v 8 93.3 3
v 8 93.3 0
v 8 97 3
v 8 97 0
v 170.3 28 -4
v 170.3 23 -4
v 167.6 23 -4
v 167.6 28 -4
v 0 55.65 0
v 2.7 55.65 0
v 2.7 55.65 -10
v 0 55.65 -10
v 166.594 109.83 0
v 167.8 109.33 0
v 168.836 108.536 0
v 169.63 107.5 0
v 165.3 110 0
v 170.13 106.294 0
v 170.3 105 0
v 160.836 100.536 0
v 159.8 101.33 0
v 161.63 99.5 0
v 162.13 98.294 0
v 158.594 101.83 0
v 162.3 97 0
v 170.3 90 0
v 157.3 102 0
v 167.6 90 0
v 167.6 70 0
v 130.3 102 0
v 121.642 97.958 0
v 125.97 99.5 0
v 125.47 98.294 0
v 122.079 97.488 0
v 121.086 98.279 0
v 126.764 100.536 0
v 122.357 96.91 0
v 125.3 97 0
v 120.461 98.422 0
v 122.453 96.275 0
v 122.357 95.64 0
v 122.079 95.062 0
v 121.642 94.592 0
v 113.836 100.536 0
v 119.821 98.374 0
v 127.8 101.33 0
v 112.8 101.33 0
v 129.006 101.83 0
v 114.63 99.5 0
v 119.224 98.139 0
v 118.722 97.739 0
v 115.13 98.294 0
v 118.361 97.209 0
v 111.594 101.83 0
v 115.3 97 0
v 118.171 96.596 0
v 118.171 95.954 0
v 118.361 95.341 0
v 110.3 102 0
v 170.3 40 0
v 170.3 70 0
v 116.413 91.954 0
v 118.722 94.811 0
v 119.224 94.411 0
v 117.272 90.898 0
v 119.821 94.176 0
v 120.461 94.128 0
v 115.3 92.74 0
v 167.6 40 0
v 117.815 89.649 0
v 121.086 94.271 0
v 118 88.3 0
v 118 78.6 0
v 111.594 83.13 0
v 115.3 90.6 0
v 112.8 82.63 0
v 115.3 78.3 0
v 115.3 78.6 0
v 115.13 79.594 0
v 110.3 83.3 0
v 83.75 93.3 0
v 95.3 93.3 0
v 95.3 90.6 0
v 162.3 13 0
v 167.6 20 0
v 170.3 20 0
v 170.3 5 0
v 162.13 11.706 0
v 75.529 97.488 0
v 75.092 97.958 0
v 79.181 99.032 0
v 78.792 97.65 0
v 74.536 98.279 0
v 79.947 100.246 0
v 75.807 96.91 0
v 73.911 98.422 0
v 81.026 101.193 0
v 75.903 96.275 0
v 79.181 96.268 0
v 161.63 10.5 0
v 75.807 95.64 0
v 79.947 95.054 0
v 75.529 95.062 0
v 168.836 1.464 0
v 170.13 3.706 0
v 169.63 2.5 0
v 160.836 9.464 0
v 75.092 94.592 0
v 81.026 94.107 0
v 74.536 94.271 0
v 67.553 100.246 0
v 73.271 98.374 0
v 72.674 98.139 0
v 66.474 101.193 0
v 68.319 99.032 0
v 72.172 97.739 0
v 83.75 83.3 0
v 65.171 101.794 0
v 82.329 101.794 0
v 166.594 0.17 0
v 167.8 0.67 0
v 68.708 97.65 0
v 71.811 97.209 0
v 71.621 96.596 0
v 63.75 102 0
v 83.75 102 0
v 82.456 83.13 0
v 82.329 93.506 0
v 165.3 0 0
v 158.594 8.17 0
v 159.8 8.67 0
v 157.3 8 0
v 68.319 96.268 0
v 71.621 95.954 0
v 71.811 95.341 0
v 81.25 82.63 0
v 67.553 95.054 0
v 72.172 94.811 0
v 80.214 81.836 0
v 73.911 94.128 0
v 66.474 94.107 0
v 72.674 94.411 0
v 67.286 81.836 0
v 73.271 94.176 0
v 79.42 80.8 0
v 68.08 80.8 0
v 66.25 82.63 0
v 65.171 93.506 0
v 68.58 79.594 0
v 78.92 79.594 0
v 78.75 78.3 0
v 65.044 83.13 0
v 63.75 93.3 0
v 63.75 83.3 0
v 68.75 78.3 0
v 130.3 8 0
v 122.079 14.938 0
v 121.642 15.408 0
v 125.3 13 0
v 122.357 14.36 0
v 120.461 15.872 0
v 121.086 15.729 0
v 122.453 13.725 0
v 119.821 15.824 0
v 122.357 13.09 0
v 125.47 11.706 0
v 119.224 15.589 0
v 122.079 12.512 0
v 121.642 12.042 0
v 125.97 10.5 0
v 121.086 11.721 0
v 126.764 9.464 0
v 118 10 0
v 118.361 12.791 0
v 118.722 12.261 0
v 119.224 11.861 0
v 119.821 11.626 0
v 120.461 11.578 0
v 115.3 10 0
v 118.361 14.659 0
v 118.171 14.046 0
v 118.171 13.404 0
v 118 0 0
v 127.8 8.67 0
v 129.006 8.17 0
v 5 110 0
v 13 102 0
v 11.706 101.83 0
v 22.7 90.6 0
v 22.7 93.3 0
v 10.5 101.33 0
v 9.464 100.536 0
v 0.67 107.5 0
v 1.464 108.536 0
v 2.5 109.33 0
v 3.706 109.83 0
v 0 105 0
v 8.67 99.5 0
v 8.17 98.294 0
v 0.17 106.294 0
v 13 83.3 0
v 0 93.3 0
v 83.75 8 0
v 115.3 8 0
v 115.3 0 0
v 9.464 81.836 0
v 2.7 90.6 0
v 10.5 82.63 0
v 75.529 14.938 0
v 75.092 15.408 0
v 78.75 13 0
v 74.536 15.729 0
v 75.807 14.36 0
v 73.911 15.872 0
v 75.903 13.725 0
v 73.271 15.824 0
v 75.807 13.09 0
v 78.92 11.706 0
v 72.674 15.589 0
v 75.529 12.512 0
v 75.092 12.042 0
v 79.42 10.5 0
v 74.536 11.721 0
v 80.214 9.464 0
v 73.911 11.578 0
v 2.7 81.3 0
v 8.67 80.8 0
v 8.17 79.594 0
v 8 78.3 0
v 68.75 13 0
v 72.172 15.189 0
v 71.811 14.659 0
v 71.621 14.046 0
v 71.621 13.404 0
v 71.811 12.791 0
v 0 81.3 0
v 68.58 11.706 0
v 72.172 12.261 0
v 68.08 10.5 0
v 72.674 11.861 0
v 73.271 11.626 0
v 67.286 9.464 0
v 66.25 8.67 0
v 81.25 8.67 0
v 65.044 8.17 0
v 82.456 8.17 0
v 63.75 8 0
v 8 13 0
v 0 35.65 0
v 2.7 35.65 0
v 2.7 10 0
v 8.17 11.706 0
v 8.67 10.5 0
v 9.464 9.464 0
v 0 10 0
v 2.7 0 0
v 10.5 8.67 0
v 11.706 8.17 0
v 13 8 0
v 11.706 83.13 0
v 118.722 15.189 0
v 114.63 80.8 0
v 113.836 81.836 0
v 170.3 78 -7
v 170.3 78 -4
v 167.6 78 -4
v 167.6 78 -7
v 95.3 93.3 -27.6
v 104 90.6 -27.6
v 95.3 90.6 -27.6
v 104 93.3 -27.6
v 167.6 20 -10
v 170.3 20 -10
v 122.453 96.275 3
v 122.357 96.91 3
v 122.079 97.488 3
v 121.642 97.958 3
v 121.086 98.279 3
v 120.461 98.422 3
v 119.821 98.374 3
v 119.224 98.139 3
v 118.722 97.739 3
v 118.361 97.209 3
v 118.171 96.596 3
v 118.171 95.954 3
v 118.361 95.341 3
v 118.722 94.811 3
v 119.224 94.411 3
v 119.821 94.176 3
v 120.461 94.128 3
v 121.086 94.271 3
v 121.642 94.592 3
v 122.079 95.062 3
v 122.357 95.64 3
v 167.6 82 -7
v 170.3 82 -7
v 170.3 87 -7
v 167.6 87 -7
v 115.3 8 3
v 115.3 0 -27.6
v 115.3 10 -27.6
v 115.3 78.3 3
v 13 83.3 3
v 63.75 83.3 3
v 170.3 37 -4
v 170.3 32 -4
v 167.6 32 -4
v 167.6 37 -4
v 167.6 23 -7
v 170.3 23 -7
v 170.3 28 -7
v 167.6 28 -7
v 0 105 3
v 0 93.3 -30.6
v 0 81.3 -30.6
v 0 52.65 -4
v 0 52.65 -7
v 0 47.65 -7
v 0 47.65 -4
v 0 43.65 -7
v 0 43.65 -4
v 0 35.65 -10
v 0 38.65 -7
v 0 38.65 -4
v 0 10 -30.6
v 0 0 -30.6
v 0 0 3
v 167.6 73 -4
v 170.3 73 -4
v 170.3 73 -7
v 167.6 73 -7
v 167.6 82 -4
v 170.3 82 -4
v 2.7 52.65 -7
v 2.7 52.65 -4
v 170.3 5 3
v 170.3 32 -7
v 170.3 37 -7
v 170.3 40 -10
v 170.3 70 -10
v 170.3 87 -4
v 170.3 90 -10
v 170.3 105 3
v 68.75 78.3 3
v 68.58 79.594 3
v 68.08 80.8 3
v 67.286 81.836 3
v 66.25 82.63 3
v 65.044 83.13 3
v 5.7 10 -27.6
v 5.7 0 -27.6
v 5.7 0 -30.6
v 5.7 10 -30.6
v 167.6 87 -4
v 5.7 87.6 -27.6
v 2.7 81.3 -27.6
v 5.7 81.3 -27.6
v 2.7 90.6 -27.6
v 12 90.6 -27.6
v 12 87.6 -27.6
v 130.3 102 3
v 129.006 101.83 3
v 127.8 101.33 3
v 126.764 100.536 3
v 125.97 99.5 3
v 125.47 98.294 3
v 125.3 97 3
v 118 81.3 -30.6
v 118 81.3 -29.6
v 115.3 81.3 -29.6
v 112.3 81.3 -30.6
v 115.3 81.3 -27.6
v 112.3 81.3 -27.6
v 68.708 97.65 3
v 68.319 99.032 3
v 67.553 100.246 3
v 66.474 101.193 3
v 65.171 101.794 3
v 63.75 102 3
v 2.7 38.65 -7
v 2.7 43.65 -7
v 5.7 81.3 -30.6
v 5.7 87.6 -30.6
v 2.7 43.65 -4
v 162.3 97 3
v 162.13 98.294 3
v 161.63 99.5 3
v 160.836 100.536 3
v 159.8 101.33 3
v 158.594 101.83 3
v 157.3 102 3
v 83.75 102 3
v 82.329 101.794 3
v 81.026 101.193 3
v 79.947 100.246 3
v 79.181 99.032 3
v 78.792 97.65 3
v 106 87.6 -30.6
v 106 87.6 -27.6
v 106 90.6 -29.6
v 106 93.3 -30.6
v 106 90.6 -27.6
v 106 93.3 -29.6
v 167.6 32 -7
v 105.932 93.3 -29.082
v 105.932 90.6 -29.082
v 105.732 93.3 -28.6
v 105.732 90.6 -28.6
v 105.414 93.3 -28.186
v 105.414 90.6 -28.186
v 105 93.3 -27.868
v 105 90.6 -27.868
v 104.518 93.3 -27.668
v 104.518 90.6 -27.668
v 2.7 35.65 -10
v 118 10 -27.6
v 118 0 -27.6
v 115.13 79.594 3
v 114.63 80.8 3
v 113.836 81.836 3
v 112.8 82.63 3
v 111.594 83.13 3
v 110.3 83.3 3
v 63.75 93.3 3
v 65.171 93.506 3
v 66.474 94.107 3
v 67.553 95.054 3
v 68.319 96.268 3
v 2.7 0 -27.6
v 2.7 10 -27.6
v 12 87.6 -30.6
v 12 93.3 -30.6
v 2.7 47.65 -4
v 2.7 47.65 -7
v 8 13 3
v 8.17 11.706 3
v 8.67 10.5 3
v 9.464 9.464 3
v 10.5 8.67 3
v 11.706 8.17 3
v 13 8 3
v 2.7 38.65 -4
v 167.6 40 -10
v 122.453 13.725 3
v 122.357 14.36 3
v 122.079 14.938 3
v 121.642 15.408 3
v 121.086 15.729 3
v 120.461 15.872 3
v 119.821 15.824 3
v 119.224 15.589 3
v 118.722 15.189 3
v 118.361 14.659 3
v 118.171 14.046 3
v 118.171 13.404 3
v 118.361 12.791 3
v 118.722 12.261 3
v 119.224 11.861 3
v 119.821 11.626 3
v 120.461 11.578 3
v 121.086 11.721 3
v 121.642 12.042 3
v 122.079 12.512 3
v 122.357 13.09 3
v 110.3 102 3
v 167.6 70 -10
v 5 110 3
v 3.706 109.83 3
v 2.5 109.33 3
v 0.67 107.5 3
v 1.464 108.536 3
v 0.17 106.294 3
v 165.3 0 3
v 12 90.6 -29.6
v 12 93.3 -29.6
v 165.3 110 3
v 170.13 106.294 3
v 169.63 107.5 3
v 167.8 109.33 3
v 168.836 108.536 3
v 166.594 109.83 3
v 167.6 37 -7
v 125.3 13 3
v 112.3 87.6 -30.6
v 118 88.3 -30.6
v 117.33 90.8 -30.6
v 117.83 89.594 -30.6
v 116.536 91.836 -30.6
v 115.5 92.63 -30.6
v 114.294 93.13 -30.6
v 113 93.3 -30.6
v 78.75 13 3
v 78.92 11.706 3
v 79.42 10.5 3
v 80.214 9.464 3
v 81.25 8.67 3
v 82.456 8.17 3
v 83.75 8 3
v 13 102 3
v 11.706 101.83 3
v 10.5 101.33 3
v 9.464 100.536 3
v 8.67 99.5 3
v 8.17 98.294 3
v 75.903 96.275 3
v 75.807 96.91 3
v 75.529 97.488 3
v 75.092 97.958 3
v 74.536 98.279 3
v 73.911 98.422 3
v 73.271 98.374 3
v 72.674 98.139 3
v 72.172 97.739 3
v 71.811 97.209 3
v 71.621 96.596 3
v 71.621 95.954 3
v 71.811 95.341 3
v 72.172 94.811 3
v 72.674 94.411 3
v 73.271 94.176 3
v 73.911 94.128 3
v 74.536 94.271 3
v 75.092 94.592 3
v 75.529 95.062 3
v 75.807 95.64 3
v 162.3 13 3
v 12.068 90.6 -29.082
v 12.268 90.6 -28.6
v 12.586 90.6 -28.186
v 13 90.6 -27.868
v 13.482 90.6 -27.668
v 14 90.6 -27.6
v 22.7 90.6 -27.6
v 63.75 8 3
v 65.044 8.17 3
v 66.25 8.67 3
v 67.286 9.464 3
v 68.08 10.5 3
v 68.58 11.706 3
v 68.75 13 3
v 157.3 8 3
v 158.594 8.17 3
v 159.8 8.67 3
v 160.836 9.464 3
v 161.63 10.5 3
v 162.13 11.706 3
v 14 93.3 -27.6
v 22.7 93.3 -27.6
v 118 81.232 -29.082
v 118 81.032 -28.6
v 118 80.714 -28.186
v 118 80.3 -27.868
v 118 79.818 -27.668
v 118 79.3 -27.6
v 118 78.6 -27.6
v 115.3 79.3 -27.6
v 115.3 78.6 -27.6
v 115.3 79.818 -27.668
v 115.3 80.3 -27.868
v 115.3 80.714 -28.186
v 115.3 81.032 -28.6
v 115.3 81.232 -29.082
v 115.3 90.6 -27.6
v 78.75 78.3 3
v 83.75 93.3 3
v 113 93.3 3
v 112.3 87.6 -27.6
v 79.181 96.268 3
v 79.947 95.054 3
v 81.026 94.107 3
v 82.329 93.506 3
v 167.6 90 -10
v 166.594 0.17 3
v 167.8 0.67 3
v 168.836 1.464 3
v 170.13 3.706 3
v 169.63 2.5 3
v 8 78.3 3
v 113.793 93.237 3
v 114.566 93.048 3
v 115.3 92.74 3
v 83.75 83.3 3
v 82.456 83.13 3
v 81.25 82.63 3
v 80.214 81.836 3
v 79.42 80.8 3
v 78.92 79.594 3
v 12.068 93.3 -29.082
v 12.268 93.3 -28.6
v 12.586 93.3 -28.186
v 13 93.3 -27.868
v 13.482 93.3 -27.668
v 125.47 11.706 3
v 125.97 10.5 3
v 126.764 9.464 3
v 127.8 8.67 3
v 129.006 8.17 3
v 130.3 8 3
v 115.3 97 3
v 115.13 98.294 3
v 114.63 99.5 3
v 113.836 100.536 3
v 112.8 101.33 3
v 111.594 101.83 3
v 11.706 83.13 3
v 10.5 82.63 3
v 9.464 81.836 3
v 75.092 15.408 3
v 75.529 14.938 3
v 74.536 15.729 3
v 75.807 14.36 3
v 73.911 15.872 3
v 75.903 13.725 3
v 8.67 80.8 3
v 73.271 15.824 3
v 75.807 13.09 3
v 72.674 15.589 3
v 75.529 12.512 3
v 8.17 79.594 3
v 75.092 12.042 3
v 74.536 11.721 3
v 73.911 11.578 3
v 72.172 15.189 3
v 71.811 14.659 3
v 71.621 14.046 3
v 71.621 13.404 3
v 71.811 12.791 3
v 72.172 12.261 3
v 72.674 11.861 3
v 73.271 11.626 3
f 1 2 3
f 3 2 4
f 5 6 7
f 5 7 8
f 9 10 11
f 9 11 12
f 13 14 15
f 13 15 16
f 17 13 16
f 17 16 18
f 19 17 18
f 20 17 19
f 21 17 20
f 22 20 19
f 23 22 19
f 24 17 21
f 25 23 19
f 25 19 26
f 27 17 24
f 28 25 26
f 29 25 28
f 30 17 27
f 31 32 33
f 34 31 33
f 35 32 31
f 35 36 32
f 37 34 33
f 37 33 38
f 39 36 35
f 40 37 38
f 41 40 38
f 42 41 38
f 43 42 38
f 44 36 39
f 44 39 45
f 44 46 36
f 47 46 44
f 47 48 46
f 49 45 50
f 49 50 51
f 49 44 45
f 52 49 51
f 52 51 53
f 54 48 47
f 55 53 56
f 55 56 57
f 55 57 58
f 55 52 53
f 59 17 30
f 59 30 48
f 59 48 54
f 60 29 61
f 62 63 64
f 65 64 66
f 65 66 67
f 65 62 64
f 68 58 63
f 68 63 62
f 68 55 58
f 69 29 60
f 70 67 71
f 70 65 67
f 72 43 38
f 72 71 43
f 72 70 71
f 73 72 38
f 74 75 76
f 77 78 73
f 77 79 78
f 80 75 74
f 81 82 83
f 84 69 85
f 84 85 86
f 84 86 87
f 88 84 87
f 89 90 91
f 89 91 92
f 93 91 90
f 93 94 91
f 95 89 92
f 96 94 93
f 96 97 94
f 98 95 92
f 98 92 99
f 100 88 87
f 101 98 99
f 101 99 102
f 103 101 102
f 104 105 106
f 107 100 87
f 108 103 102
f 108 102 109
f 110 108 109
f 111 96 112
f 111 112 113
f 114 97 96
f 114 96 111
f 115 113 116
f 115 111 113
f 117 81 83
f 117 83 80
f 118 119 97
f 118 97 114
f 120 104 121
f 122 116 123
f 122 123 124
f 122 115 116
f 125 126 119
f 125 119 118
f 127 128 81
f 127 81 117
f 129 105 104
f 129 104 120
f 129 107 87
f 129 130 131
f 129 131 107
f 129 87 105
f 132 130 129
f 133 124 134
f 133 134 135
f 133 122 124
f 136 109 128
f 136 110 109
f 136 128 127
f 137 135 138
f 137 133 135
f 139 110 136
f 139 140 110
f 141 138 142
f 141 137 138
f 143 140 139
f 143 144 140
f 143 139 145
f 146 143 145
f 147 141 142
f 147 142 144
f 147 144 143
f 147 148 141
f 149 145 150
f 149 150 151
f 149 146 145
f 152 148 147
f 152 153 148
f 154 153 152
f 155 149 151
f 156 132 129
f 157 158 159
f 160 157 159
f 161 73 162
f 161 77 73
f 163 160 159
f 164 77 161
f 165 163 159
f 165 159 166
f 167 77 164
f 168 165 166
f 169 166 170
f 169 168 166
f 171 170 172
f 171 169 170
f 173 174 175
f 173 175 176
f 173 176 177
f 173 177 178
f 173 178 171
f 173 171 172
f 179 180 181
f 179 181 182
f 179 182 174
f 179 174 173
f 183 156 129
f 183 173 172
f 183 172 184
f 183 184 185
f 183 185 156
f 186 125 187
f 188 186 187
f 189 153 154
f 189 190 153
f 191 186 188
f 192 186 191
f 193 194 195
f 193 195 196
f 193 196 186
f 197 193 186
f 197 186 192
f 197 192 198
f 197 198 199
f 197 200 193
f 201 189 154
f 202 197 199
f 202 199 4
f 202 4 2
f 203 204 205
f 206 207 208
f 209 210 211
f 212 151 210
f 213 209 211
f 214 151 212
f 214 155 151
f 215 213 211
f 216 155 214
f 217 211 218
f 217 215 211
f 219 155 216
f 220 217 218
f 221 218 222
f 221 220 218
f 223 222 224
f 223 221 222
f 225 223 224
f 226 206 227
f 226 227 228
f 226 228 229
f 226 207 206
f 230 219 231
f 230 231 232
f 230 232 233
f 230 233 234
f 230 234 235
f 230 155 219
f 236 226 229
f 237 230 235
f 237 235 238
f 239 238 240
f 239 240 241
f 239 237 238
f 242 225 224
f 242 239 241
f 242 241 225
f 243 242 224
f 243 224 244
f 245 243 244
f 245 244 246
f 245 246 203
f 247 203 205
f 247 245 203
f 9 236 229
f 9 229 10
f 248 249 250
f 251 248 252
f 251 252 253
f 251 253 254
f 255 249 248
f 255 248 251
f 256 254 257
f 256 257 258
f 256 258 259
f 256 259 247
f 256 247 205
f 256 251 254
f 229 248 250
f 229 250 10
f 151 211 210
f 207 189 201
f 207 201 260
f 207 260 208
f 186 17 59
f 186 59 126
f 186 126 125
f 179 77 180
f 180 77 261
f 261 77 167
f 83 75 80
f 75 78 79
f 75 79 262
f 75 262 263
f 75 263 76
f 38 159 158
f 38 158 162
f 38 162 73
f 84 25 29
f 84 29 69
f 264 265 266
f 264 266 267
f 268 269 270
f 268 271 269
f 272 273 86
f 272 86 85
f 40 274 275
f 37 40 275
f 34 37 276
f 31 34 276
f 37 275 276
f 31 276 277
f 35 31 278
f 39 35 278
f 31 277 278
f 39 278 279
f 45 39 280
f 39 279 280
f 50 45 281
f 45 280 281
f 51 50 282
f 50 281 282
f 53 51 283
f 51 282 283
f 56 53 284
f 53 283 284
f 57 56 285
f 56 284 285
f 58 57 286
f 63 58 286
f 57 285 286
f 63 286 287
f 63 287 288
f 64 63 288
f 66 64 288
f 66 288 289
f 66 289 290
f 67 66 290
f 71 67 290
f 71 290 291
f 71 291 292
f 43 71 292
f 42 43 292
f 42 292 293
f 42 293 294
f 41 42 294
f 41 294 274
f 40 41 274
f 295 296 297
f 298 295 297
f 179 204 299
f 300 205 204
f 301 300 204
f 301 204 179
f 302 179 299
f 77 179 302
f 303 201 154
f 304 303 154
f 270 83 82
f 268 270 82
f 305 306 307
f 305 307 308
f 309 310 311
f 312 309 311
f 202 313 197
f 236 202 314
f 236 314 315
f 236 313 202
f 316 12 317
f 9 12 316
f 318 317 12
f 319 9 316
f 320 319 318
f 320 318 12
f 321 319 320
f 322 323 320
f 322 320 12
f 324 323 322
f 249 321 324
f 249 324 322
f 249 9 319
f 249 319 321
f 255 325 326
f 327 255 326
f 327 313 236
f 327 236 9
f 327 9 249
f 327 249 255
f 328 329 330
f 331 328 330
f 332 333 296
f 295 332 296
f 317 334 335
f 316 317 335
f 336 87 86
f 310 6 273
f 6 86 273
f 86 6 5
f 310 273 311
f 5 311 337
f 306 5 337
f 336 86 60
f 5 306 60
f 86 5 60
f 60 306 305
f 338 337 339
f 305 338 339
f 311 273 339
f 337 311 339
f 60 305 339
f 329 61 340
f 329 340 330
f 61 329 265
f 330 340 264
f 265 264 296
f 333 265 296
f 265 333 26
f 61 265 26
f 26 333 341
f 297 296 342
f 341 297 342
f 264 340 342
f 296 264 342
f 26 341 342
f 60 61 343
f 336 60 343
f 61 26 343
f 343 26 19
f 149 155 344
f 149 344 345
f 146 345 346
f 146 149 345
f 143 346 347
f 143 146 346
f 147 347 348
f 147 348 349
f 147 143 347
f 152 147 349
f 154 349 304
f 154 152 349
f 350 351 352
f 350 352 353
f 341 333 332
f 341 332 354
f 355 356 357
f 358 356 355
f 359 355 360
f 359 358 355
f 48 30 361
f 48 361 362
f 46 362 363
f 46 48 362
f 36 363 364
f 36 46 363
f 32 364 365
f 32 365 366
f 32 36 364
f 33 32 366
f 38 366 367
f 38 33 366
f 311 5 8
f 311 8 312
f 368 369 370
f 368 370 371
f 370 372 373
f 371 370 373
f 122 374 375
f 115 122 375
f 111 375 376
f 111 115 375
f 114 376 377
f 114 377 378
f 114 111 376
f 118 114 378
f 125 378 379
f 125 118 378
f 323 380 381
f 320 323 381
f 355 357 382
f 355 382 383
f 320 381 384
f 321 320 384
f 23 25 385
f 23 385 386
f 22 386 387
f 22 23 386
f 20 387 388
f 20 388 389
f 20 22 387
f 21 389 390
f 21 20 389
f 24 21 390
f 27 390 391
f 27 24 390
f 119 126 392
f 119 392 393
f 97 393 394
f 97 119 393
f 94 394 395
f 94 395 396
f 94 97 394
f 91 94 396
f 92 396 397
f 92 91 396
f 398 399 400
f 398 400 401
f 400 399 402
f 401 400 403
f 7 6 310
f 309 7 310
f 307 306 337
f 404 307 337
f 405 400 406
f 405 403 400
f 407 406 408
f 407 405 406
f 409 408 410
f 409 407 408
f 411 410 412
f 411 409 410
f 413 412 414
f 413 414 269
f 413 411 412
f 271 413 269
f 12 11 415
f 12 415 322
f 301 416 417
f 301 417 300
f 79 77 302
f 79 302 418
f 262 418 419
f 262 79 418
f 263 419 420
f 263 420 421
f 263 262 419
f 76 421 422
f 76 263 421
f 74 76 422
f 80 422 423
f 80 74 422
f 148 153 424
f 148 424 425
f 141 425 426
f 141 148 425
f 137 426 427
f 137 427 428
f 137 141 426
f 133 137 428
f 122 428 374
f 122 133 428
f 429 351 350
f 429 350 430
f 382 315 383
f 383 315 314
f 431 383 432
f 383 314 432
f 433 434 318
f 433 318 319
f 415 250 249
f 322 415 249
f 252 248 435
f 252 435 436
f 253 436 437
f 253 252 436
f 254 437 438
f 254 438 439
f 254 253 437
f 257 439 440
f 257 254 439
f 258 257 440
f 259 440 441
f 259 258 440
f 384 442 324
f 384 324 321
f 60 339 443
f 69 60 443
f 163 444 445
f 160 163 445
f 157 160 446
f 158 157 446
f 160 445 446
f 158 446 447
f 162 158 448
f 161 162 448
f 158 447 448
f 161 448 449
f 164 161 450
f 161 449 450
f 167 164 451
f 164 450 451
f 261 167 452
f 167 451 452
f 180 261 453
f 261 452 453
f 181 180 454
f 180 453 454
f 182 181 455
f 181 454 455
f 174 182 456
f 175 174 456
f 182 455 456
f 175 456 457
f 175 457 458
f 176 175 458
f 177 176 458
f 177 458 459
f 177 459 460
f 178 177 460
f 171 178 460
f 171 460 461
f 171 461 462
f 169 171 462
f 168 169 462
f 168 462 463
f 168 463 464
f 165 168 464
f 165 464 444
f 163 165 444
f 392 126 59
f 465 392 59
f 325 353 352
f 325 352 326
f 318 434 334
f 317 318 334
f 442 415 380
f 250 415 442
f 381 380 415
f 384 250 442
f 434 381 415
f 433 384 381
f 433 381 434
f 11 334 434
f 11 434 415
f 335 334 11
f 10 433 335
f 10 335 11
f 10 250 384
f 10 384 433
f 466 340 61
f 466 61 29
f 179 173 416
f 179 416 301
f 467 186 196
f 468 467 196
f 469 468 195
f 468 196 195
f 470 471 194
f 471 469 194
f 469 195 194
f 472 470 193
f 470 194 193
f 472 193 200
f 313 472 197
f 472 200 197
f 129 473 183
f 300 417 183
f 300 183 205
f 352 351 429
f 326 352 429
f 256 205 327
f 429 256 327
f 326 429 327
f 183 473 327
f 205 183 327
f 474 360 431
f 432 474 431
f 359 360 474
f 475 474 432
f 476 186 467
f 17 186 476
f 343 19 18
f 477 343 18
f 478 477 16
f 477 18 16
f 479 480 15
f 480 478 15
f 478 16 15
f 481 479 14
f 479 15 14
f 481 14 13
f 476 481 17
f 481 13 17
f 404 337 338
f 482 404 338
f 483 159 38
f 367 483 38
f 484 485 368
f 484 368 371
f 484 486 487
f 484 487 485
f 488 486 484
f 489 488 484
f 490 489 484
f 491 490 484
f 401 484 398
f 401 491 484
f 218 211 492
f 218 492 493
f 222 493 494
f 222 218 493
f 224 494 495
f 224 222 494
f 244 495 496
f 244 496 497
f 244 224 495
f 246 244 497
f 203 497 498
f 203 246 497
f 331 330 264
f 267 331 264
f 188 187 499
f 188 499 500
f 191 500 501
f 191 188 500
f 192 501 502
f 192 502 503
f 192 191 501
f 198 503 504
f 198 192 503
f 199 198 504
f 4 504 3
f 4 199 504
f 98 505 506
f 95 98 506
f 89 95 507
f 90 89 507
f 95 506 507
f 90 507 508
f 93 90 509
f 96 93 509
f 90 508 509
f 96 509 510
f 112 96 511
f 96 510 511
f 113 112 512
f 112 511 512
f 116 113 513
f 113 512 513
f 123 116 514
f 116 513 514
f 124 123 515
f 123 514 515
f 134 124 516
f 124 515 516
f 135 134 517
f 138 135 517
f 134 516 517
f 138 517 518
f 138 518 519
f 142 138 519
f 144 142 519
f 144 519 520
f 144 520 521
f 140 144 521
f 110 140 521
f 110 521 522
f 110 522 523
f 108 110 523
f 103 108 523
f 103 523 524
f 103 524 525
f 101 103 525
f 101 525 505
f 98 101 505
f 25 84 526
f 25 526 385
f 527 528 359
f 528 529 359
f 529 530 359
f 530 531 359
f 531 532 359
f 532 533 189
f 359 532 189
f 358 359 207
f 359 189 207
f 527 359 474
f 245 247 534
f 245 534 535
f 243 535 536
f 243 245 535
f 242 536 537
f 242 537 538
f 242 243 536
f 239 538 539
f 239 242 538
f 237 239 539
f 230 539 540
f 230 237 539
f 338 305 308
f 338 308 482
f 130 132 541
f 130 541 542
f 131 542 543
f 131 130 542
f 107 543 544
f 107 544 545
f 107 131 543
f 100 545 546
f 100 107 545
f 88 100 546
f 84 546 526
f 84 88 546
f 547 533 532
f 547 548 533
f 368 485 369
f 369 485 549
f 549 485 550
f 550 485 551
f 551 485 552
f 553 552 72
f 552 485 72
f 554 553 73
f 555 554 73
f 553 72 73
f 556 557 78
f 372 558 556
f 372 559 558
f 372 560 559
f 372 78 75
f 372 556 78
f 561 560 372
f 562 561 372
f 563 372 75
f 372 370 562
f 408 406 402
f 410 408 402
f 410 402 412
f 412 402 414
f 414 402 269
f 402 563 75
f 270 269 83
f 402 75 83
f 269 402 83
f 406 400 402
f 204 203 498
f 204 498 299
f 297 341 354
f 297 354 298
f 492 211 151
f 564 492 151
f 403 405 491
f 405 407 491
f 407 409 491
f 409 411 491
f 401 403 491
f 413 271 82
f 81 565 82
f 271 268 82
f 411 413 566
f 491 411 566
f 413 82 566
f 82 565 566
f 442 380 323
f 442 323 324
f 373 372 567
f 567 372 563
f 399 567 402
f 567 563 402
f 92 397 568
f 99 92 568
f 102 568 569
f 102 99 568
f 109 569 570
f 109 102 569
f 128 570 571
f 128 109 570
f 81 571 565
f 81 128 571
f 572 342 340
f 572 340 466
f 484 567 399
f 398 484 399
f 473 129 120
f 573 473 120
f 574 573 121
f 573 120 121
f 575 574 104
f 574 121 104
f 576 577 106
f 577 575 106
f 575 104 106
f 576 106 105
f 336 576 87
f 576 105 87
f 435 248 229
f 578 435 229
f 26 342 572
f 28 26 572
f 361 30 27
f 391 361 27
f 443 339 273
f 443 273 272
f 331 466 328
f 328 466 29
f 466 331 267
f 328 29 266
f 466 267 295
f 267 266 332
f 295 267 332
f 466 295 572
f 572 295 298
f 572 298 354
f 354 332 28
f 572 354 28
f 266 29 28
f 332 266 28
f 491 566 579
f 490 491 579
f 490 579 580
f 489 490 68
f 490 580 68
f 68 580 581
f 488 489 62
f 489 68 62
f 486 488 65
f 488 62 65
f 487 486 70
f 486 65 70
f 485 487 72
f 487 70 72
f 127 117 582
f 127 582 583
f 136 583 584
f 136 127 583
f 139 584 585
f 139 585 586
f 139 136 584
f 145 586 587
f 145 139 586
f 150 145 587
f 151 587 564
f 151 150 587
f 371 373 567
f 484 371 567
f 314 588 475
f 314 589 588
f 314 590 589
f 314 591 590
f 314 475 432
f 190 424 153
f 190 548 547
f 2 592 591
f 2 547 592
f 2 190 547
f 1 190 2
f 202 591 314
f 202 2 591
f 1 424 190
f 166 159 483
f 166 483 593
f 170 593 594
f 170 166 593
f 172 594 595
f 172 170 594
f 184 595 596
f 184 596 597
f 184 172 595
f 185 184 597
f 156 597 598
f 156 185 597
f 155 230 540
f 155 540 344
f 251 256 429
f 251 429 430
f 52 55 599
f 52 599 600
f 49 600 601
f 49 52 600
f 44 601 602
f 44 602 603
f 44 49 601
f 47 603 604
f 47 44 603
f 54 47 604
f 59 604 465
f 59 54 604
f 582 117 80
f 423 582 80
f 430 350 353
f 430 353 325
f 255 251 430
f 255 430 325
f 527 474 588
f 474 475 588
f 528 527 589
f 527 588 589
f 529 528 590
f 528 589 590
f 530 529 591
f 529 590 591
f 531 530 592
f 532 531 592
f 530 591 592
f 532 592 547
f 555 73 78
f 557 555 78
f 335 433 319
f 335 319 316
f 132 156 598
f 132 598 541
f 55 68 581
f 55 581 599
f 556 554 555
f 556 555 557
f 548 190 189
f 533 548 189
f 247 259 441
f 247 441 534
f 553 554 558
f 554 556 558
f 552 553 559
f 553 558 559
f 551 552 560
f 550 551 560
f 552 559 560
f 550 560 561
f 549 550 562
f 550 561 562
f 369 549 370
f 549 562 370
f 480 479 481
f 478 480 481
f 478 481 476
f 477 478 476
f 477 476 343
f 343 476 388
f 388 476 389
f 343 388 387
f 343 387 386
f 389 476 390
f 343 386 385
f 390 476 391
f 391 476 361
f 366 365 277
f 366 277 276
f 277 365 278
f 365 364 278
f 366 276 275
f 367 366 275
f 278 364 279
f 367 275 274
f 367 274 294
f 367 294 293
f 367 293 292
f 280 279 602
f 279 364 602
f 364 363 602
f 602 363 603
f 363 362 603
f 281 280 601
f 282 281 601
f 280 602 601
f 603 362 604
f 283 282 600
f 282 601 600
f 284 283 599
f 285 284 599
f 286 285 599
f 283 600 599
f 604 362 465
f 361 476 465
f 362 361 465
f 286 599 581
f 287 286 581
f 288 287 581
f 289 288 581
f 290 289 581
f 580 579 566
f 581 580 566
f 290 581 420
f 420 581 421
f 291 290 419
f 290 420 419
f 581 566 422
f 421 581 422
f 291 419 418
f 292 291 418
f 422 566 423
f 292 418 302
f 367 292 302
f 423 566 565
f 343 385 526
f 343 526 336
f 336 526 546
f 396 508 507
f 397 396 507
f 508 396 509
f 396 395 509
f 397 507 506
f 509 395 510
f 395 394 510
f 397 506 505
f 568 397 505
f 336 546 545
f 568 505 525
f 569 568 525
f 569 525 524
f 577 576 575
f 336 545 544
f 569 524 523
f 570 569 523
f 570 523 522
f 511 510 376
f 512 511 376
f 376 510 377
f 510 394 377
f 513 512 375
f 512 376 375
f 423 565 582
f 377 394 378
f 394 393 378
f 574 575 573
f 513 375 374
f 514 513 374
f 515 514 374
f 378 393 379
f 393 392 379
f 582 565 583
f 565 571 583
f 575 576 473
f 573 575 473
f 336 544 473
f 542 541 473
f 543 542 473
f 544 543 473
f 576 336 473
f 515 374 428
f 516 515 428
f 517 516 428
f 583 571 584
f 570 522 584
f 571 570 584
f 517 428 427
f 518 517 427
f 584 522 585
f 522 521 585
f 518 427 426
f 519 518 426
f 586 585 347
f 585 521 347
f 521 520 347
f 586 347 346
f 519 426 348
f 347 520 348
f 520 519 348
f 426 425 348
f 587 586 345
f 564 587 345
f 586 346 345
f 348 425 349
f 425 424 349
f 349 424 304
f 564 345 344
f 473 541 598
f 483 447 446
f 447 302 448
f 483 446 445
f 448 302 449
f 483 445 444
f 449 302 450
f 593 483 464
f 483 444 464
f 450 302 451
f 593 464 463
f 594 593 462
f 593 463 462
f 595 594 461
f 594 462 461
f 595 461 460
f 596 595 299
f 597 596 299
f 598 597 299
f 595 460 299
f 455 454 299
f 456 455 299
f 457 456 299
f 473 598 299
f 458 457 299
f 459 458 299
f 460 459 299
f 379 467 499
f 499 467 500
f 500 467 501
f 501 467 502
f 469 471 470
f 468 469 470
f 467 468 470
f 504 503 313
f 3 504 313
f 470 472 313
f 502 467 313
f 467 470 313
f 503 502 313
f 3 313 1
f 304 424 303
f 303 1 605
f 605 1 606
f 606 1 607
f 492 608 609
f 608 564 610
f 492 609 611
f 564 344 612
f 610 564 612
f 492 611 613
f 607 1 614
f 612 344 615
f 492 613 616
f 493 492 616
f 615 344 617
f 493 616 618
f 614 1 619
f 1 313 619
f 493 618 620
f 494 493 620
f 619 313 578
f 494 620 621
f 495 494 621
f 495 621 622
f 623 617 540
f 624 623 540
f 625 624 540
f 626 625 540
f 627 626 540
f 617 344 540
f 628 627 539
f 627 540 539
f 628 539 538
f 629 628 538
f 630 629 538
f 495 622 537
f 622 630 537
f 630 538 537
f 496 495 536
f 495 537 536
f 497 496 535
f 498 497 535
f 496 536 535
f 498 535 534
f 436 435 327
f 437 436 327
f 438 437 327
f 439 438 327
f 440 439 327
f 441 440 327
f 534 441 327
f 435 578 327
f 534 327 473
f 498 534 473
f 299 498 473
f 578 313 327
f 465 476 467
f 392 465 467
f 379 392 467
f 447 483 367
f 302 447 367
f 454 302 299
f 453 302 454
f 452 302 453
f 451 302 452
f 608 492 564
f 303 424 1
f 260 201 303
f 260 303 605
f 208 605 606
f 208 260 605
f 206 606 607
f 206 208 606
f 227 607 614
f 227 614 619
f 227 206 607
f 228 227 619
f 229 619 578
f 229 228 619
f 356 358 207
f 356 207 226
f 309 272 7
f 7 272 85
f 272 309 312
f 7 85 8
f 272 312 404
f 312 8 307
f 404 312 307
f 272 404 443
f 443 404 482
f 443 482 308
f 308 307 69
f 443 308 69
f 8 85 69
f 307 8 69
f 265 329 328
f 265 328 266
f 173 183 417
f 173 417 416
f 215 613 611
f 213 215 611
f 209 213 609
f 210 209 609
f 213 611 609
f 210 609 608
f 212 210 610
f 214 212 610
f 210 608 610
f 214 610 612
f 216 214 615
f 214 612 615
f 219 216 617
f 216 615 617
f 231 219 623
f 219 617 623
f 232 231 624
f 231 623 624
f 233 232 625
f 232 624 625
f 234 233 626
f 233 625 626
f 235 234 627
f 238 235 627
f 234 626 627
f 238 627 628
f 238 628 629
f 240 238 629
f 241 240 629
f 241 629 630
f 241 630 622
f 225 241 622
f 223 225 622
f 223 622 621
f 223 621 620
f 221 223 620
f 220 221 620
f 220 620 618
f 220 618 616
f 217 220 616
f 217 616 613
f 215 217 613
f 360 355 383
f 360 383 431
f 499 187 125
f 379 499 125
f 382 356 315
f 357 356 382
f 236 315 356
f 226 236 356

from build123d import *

# Parameters (mm, degrees)
SKETCH1_W               = 170.3
SKETCH1_H               = 110
SKETCH1_W_2             = 60.75
SKETCH1_H_2             = 75.3
SKETCH1_H_3             = 8.7
SKETCH1_W_3             = 37
SKETCH1_H_4             = 94
SKETCH1_W_4             = 36.55
BOSS_EXTRUDE1_DEPTH     = 3
F_6_CLEARANCE_HOLE1_D   = 4.3053
SKETCH6_W               = 2.7
SKETCH6_H               = 10
BOSS_EXTRUDE2_DEPTH     = 27.6
SKETCH7_W               = 5.7
SKETCH7_H               = 10
BOSS_EXTRUDE3_DEPTH     = 3
FILLET3_R               = 5
FILLET4_R               = 2
FILLET5_R               = 5
SKETCH8_W               = 2.7
SKETCH8_H               = 20
BOSS_EXTRUDE4_DEPTH     = 10
CUT_EXTRUDE1_DEPTH      = 206.032802254
CUT_EXTRUDE1_DEPTH_BACK = 3
SKETCH9_W               = 3
SKETCH9_H               = 5
SKETCH11_W              = 2.7
SKETCH11_H              = 20
BOSS_EXTRUDE5_DEPTH     = 10
SKETCH12_W              = 3
SKETCH12_H              = 5
CUT_EXTRUDE2_DEPTH      = 3


with BuildPart() as part:
    # Sketch1 → Boss-Extrude1 (new body)
    with BuildSketch(Plane.XY):
        with Locations((85.15, 55)):
            Rectangle(SKETCH1_W, SKETCH1_H)
        with Locations((38.375, 45.65)):
            Rectangle(SKETCH1_W_2, SKETCH1_H_2, mode=Mode.SUBTRACT)
        with Locations((38.375, 97.65)):
            Rectangle(SKETCH1_W_2, SKETCH1_H_3, mode=Mode.SUBTRACT)
        with Locations((143.8, 55)):
            Rectangle(SKETCH1_W_3, SKETCH1_H_4, mode=Mode.SUBTRACT)
        with Locations((97.025, 45.65)):
            Rectangle(SKETCH1_W_4, SKETCH1_H_2, mode=Mode.SUBTRACT)
        with Locations((97.025, 97.65)):
            Rectangle(SKETCH1_W_4, SKETCH1_H_3, mode=Mode.SUBTRACT)
    extrude(amount=BOSS_EXTRUDE1_DEPTH)

    # #6 Clearance Hole1 (through all)
    with Locations(Plane(origin=(0, 0, 0), x_dir=(-1, 0, 0), z_dir=(0, 0, -1))):
        with Locations((-120.3, 13.725), (-120.3, 96.275), (-73.75, 13.725), (-73.75, 96.275)):
            Hole(F_6_CLEARANCE_HOLE1_D / 2)

    # Sketch6 → Boss-Extrude2 (add)
    with BuildSketch(Plane(origin=(0, 0, 0), x_dir=(-1, 0, 0), z_dir=(0, 0, -1))):
        with Locations((-1.35, 5)):
            Rectangle(SKETCH6_W, SKETCH6_H)
        with Locations((-116.65, 5)):
            Rectangle(SKETCH6_W, SKETCH6_H)
        Polygon((0, 81.3), (0, 93.3), (-22.7, 93.3), (-22.7, 90.6), (-2.7, 90.6), (-2.7, 81.3), align=None)
        Polygon((-95.3, 93.3), (-118, 93.3), (-118, 78.6), (-115.3, 78.6), (-115.3, 90.6), (-95.3, 90.6), align=None)
    extrude(amount=BOSS_EXTRUDE2_DEPTH)

    # Sketch7 → Boss-Extrude3 (add)
    with BuildSketch(Plane(origin=(0, 0, -27.6), x_dir=(-1, 0, 0), z_dir=(0, 0, -1))):
        Polygon((0, 93.3), (0, 81.3), (-5.7, 81.3), (-5.7, 87.6), (-12, 87.6), (-12, 93.3), align=None)
        with Locations((-2.85, 5)):
            Rectangle(SKETCH7_W, SKETCH7_H)
        Polygon((-118, 93.3), (-118, 81.3), (-112.3, 81.3), (-112.3, 87.6), (-106, 87.6), (-106, 93.3), align=None)
    extrude(amount=BOSS_EXTRUDE3_DEPTH)

    # Fillet3
    fillet3_edges = [part.edges().sort_by_distance(p)[0] for p in [
        (118, 93.3, -15.3),
    ]]
    fillet(fillet3_edges, radius=FILLET3_R)

    # Fillet4
    fillet4_edges = [part.edges().sort_by_distance(p)[0] for p in [
        (12, 91.95, -27.6),
        (106, 91.95, -27.6),
        (116.65, 81.3, -27.6),
    ]]
    fillet(fillet4_edges, radius=FILLET4_R)

    # Fillet5
    # the kernel refuses this fillet: 5 mm, written as the material it adds along each edge
    with BuildSketch(Plane(origin=(8, 83.3, 0), x_dir=(0, -1, 0), z_dir=(0, 0, 1)), Plane(origin=(68.75, 83.3, 0), x_dir=(-1, 0, 0), z_dir=(0, 0, 1)), Plane(origin=(125.3, 102, 0), x_dir=(0, -1, 0), z_dir=(0, 0, 1)), Plane(origin=(125.3, 8, 0), x_dir=(1, 0, 0), z_dir=(0, 0, 1)), Plane(origin=(68.75, 93.3, 0), x_dir=(0, 1, 0), z_dir=(0, 0, 1)), Plane(origin=(68.75, 102, 0), x_dir=(-1, 0, 0), z_dir=(0, 0, 1)), Plane(origin=(78.75, 8, 0), x_dir=(1, 0, 0), z_dir=(0, 0, 1)), Plane(origin=(78.75, 102, 0), x_dir=(0, -1, 0), z_dir=(0, 0, 1)), Plane(origin=(78.75, 93.3, 0), x_dir=(1, 0, 0), z_dir=(0, 0, 1))) as fillet5_piece_1:
        with BuildLine():
            CenterArc((FILLET5_R, FILLET5_R), FILLET5_R, 180, 90)
            Line((0, FILLET5_R), (0, 0))
            Line((0, 0), (FILLET5_R, 0))
        make_face()
    extrude(amount=3)
    with BuildSketch(Plane(origin=(8, 8, 0), x_dir=(0, 1, 0), z_dir=(0, 0, 1)), Plane(origin=(68.75, 8, 0), x_dir=(-1, 0, 0), z_dir=(0, 0, 1)), Plane(origin=(162.3, 102, 0), x_dir=(0, -1, 0), z_dir=(0, 0, 1)), Plane(origin=(162.3, 8, 0), x_dir=(-1, 0, 0), z_dir=(0, 0, 1)), Plane(origin=(8, 102, 0), x_dir=(1, 0, 0), z_dir=(0, 0, 1)), Plane(origin=(115.3, 83.3, 0), x_dir=(0, -1, 0), z_dir=(0, 0, 1)), Plane(origin=(78.75, 83.3, 0), x_dir=(1, 0, 0), z_dir=(0, 0, 1)), Plane(origin=(115.3, 102, 0), x_dir=(0, -1, 0), z_dir=(0, 0, 1))) as fillet5_piece_2:
        with BuildLine():
            CenterArc((FILLET5_R, -FILLET5_R), FILLET5_R, 90, 90)
            Line((0, -FILLET5_R), (0, 0))
            Line((0, 0), (FILLET5_R, 0))
        make_face()
    extrude(amount=3)
    # the kernel refuses this fillet: 5 mm, written as the material it takes off along each edge
    with BuildSketch(Plane(origin=(0, 110, -12.5), x_dir=(0, -1, 0), z_dir=(0, 0, 1)), Plane(origin=(170.3, 110, -12.5), x_dir=(-1, 0, 0), z_dir=(0, 0, 1)), Plane(origin=(170.3, 0, -12.5), x_dir=(0, 1, 0), z_dir=(0, 0, 1))) as fillet5_2_piece_1:
        with BuildLine():
            CenterArc((FILLET5_R, FILLET5_R), FILLET5_R, 180, 90)
            Line((0, FILLET5_R), (0, 0))
            Line((0, 0), (FILLET5_R, 0))
        make_face()
    extrude(amount=28, mode=Mode.SUBTRACT)

    # Sketch8 → Boss-Extrude4 (add)
    with BuildSketch(Plane(origin=(0, 0, 0), x_dir=(-1, 0, 0), z_dir=(0, 0, -1))):
        with Locations((-1.35, 45.65)):
            Rectangle(SKETCH8_W, SKETCH8_H)
    extrude(amount=BOSS_EXTRUDE4_DEPTH)

    # Sketch9 → Cut-Extrude1 (cut, two sides: drawn at the far end of the back side and taken through both)
    with BuildSketch(Plane.ZY.offset(-CUT_EXTRUDE1_DEPTH_BACK)):
        with Locations((-5.5, 41.15)):
            Rectangle(SKETCH9_W, SKETCH9_H)
        with Locations((-5.5, 50.15)):
            Rectangle(SKETCH9_W, SKETCH9_H)
    extrude(amount=CUT_EXTRUDE1_DEPTH + CUT_EXTRUDE1_DEPTH_BACK, mode=Mode.SUBTRACT)

    # Sketch11 → Boss-Extrude5 (add)
    with BuildSketch(Plane(origin=(0, 0, 0), x_dir=(-1, 0, 0), z_dir=(0, 0, -1))):
        with Locations((-168.95, 30)):
            Rectangle(SKETCH11_W, SKETCH11_H)
        with Locations((-168.95, 80)):
            Rectangle(SKETCH11_W, SKETCH11_H)
    extrude(amount=BOSS_EXTRUDE5_DEPTH)

    # Sketch12 → Cut-Extrude2 (cut)
    with BuildSketch(Plane(origin=(170.3, 0, 0), x_dir=(0, 0, -1), z_dir=(1, 0, 0))):
        with Locations((5.5, 34.5)):
            Rectangle(SKETCH12_W, SKETCH12_H)
        with Locations((5.5, 25.5)):
            Rectangle(SKETCH12_W, SKETCH12_H)
        with Locations((5.5, 84.5)):
            Rectangle(SKETCH12_W, SKETCH12_H)
        with Locations((5.5, 75.5)):
            Rectangle(SKETCH12_W, SKETCH12_H)
    extrude(amount=-CUT_EXTRUDE2_DEPTH, mode=Mode.SUBTRACT)


solid = part.part
